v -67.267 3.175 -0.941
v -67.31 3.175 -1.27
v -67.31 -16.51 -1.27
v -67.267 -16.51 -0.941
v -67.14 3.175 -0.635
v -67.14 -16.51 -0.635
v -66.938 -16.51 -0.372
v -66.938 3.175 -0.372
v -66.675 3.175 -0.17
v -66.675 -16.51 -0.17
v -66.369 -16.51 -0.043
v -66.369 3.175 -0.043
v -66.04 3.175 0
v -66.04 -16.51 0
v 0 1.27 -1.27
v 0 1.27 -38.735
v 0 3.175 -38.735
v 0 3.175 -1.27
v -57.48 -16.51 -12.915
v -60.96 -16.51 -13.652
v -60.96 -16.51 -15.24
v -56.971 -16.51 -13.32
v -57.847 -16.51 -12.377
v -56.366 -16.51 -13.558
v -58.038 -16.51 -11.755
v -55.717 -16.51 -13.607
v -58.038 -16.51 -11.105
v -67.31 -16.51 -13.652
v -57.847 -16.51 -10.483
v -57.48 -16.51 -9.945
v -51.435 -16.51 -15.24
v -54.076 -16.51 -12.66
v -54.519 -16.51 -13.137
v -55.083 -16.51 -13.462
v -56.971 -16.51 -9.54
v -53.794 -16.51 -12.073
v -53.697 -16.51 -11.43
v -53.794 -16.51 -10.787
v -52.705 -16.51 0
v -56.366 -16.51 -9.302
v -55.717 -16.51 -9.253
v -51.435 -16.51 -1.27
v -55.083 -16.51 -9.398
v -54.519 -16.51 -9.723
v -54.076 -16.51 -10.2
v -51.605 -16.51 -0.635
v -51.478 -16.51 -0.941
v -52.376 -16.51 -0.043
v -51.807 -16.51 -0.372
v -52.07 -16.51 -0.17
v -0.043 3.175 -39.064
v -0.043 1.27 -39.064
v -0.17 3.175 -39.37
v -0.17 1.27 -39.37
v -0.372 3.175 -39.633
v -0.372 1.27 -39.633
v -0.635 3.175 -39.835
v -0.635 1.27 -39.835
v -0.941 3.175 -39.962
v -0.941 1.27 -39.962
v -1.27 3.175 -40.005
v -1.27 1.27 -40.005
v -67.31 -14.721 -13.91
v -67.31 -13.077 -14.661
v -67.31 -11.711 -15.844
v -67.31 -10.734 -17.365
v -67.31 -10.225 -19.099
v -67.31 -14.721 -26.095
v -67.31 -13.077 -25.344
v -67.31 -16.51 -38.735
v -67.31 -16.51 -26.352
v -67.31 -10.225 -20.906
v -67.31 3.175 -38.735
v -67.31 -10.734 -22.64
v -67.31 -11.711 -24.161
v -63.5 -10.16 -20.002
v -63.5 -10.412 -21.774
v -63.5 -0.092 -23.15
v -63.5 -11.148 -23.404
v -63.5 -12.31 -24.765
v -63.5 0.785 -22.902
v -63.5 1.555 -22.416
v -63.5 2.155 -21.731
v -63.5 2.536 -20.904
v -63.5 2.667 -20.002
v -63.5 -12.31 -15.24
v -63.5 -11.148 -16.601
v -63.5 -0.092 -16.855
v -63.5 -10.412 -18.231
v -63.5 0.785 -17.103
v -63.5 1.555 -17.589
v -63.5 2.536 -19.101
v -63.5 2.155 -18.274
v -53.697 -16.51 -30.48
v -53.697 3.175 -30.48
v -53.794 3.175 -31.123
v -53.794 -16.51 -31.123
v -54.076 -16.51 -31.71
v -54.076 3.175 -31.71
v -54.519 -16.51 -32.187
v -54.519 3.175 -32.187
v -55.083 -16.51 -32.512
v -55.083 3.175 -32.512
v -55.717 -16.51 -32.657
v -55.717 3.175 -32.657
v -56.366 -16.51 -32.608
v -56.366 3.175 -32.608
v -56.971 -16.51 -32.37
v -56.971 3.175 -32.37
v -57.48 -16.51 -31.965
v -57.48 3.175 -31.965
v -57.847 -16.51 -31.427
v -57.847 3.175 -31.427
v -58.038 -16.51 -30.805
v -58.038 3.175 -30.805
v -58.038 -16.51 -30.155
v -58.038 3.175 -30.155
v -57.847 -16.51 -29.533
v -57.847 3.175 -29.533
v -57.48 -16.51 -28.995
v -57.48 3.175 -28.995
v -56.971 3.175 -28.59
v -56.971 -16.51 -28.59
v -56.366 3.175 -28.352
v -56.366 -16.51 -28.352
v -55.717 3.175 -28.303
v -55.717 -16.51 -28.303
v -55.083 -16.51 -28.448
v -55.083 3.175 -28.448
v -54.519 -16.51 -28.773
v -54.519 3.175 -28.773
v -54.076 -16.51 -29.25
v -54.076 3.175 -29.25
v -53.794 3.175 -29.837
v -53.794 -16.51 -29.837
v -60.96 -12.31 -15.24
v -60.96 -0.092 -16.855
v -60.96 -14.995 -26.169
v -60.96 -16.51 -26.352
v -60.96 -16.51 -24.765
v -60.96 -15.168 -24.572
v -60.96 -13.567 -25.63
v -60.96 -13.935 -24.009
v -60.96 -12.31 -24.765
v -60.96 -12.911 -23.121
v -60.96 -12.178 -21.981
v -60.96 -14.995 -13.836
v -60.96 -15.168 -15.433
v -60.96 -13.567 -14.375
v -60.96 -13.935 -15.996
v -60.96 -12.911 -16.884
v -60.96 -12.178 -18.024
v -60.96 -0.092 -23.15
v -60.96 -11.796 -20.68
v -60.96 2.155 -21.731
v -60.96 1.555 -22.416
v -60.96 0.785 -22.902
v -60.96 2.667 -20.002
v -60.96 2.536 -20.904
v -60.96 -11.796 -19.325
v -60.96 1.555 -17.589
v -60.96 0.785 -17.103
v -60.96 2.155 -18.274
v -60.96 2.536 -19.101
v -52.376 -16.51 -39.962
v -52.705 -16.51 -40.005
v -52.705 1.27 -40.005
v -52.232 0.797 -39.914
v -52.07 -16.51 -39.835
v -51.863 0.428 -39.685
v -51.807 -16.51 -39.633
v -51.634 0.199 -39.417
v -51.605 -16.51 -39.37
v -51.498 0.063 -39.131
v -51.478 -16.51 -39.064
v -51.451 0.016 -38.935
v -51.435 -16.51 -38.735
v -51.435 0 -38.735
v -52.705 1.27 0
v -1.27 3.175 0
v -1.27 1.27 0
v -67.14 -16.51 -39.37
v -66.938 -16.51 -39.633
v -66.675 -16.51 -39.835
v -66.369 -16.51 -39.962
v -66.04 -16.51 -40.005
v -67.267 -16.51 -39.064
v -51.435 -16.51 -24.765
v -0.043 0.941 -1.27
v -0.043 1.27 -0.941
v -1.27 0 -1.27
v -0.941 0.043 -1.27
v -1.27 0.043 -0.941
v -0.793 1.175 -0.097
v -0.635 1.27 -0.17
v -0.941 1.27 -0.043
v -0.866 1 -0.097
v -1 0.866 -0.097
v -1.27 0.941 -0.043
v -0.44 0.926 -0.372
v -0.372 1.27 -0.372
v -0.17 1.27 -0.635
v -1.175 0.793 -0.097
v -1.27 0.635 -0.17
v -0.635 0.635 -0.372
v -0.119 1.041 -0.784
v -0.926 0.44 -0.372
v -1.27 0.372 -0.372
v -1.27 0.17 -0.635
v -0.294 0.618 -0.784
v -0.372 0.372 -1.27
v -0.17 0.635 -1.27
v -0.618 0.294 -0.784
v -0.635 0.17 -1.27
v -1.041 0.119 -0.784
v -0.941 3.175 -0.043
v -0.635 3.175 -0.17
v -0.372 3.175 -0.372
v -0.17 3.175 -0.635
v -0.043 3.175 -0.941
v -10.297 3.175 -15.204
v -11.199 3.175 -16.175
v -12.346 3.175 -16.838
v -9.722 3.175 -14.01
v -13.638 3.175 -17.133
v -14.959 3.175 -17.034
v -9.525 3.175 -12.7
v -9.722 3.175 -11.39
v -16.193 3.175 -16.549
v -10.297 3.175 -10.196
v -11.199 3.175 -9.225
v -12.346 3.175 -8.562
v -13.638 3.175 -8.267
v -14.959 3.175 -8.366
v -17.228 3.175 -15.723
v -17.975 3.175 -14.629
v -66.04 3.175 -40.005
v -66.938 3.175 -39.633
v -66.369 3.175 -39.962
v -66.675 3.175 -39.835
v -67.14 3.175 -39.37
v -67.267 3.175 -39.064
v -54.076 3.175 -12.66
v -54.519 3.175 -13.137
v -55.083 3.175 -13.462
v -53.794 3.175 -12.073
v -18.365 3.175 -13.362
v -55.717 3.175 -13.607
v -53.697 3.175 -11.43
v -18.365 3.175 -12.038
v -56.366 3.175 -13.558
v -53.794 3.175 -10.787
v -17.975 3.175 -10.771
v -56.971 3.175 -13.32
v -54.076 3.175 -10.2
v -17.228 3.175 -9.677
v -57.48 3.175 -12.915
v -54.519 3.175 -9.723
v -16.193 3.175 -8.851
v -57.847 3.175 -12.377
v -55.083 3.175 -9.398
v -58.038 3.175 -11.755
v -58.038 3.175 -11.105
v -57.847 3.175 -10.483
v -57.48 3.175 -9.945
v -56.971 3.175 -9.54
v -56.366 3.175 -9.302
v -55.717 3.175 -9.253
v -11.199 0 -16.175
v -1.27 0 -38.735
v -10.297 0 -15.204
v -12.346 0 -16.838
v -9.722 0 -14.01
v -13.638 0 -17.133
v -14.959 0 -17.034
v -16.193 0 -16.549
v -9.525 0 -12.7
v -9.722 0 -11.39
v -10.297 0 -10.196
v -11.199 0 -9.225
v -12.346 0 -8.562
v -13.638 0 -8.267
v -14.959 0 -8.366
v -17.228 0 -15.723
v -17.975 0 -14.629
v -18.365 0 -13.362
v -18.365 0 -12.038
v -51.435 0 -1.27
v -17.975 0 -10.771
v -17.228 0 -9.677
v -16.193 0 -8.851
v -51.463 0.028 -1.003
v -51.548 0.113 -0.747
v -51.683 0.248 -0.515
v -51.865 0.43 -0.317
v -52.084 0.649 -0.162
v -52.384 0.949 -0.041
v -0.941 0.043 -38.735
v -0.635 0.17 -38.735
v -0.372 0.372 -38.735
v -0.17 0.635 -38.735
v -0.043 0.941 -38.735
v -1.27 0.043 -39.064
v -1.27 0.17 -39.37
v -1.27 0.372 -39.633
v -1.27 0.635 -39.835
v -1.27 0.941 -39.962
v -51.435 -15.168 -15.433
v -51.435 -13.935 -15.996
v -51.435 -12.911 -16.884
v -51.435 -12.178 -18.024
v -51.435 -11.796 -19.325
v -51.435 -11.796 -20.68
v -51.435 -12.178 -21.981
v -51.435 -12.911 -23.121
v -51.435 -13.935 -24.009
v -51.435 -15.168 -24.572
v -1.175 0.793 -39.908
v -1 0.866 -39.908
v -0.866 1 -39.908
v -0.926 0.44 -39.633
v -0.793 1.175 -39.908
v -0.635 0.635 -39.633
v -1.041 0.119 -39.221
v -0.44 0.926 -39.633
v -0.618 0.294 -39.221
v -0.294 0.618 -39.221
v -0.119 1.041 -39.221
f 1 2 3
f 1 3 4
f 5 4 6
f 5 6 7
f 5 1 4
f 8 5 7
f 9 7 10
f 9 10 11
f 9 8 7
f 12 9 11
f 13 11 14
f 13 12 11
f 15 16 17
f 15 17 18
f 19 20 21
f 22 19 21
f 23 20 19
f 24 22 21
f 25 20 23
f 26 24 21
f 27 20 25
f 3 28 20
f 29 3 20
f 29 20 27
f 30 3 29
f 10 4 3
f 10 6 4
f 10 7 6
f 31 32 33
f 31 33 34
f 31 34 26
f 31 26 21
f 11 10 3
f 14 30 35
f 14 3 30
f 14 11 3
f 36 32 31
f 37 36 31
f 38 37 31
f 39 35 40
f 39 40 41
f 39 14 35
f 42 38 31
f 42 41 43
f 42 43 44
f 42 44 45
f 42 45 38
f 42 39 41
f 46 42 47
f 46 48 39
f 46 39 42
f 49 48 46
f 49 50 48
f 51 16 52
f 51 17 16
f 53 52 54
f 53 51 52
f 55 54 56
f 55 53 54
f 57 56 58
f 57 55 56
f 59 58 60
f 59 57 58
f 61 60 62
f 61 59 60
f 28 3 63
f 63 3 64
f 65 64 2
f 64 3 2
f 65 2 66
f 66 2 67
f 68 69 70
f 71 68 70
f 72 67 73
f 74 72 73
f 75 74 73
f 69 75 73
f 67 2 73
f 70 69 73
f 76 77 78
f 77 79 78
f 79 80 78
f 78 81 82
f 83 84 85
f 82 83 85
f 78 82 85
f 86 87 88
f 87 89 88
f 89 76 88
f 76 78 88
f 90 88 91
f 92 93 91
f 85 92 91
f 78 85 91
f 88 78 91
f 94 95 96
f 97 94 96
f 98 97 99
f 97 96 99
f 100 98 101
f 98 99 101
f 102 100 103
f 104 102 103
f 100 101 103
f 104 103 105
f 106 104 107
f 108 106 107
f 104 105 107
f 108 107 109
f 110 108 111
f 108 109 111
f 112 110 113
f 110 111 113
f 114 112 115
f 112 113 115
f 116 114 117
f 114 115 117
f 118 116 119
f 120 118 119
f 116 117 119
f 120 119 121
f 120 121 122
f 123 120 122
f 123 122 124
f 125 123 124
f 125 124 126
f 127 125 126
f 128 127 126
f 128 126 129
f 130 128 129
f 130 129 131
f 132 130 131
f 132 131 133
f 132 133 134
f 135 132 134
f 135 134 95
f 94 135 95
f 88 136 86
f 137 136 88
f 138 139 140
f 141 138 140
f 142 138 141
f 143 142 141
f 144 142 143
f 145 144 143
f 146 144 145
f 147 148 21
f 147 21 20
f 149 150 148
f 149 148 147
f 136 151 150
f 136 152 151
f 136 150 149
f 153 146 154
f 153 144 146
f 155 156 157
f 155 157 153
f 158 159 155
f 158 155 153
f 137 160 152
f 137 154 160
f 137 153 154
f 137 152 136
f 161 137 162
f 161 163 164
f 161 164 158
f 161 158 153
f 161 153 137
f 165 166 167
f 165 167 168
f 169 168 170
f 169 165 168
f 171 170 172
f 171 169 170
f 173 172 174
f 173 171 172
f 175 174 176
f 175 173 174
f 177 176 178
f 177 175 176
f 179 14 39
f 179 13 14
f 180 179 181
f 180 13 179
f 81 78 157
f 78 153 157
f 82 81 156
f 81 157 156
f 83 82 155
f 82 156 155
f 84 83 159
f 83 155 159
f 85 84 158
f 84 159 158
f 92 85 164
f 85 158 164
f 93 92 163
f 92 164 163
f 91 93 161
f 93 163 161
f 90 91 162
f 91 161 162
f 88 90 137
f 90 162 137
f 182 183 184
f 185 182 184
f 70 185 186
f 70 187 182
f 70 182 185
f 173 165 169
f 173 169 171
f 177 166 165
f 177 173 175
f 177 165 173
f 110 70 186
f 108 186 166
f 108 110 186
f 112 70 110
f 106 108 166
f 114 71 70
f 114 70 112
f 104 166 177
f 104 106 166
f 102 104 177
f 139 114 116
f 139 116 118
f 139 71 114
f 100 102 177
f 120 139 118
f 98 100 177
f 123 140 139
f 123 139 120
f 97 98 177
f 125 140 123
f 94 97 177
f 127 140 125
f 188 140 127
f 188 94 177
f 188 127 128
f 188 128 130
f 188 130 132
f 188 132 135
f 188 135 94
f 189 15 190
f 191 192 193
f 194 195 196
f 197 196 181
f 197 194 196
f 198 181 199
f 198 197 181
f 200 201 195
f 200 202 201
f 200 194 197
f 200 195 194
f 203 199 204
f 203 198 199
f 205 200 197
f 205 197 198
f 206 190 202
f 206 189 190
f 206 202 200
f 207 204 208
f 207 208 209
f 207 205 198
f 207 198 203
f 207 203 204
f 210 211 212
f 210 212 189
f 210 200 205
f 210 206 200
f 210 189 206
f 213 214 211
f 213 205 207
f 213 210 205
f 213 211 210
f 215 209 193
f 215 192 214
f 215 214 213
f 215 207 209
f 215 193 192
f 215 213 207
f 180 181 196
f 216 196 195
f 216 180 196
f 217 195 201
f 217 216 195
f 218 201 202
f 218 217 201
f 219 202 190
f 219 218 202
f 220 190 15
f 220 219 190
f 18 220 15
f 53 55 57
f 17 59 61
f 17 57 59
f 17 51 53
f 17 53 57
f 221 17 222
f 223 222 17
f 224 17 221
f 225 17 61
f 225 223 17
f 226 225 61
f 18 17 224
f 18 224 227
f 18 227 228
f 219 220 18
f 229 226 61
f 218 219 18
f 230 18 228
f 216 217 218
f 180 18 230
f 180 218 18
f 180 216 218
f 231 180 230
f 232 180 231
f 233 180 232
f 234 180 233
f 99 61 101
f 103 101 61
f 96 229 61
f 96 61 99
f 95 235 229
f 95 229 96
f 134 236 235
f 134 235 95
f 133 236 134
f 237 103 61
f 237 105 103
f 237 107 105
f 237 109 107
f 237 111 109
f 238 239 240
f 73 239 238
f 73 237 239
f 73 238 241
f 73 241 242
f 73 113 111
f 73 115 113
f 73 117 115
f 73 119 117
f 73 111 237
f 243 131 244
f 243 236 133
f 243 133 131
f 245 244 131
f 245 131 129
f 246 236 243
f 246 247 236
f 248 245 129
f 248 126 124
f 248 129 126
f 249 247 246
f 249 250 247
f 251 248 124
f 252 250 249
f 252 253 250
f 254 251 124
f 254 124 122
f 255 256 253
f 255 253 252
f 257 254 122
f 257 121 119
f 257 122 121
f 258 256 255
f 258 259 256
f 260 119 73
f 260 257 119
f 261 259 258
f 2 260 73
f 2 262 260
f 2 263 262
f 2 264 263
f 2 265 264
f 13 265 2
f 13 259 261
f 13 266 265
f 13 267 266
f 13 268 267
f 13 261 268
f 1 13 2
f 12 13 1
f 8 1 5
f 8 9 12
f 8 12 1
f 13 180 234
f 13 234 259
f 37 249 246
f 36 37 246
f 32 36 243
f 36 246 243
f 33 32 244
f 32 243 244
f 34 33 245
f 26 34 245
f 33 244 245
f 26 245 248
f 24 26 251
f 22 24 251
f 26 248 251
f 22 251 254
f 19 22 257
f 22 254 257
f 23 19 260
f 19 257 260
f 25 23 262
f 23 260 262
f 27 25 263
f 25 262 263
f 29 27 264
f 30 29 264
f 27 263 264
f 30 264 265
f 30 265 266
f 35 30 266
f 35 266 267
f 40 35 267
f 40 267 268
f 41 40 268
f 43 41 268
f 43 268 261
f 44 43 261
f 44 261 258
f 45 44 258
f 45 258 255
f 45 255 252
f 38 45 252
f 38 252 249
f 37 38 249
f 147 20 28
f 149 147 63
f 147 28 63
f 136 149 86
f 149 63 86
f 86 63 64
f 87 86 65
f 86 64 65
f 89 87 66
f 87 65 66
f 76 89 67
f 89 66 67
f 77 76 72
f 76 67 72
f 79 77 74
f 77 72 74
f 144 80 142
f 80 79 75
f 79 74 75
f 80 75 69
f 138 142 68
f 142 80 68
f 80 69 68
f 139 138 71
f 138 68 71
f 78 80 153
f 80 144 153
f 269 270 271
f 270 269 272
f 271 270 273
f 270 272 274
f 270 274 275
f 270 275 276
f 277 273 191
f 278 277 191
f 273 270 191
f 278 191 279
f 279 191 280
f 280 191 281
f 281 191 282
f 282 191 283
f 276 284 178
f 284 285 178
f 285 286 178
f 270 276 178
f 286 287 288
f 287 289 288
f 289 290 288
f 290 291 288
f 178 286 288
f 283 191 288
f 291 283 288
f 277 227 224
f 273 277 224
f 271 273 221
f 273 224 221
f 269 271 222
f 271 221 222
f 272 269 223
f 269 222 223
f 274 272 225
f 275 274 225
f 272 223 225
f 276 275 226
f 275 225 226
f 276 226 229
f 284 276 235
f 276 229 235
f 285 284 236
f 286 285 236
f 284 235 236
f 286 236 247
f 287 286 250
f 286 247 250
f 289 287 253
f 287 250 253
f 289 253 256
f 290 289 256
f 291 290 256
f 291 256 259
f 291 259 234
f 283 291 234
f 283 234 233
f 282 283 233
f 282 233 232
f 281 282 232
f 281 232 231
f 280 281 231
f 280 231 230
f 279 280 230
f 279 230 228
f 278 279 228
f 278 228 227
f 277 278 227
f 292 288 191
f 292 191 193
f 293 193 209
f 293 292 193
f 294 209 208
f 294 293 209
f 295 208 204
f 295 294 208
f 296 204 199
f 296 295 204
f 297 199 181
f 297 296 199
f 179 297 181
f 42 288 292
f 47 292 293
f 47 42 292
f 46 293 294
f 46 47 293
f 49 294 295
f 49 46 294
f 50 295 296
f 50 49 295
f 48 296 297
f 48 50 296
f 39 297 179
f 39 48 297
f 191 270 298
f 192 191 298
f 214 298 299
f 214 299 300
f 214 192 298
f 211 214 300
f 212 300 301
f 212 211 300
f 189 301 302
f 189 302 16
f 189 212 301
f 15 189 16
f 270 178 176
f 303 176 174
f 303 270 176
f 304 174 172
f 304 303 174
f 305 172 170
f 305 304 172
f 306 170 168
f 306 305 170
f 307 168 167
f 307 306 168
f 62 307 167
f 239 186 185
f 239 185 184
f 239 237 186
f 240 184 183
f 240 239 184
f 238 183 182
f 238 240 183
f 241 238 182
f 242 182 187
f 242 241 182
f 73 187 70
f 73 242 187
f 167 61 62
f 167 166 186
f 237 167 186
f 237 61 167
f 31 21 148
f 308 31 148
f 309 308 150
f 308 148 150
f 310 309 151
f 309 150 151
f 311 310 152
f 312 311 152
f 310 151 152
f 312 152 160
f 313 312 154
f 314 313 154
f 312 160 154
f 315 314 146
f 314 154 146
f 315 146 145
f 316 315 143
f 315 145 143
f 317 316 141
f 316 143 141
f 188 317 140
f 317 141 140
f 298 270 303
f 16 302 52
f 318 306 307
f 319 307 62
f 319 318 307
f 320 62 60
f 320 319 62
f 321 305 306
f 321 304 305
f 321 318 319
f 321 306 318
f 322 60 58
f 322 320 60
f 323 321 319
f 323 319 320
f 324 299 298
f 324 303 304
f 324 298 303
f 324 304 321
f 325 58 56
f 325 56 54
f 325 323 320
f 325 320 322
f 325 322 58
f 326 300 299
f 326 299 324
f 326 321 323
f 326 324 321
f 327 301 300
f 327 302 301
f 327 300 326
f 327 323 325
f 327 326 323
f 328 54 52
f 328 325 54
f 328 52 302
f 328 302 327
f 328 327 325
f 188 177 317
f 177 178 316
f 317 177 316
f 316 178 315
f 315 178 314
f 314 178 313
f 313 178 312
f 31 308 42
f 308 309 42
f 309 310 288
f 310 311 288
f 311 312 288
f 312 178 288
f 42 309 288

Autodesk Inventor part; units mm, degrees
ref_plane "YZ Plane" through (0, 0, 0) normal (1, 0, 0) x (0, 1, 0)
ref_plane "XZ Plane" through (0, 0, 0) normal (0, 1, 0) x (-1, 0, 0)
ref_plane "XY Plane" through (0, 0, 0) normal (0, 0, 1) x (1, 0, 0)
sketch "Sketch1" plane through (0, 0, 0) normal (0, 1, 0) x (-1, 0, 0)
  line L0 (0, 0) -> (67.31, 0)
  line L1 (67.31, 0) -> (67.31, -40.005)
  line L2 (67.31, -40.005) -> (0, -40.005)
  line L3 (0, -40.005) -> (0, 0)
  dimension "d0" = 40.005
  dimension "d1" = 67.31
extrude "Extrusion1" add sketch "Sketch1" along normal blind 3.175
sketch "Sketch2" plane through (0, 3.175, 0) normal (0, 1, 0) x (1, 0, 0)
  circle A0 centre (-13.97, 12.7) radius 4.445
  line L0 (0, 0) -> (0, 40.005) projected
  line L1 (-67.31, 0) -> (0, 0) projected
  dimension "d4" = 13.97
  dimension "d5" = 12.7
  dimension "d28" = 8.89
extrude "Extrusion2" cut sketch "Sketch2" against normal blind 6.35
sketch "Sketch3" plane through (0, 0, 0) normal (0, -1, 0) x (1, 0, 0)
  line L0 (0, -40.005) -> (-67.31, -40.005) projected
  line L1 (-67.31, 0) -> (0, 0) projected
  line L2 (-67.31, -40.005) -> (-51.435, -40.005)
  line L3 (-51.435, -40.005) -> (-51.435, 0)
  line L4 (-51.435, 0) -> (-67.31, 0)
  line L5 (-67.31, 0) -> (-67.31, -40.005)
  dimension "d8" = 15.875
extrude "Extrusion3" add sketch "Sketch3" along normal blind 16.51
sketch "Sketch4" plane through (-67.31, 3.175, -40.005) normal (-1, 0, 0) x (0, 0, 1)
  line L0 (40.005, -19.685) -> (0, -19.685) projected
  circle A0 centre (20.0025, -19.685) radius 6.35
  point P0 (40.005, -3.175)
  point P1 (13.6525, -19.685)
  point P2 (26.3525, -19.685)
  dimension "d11" = 12.7
extrude "Extrusion4" cut sketch "Sketch4" against normal blind 6.35 contours L0 A0 picked at (22.0577, -19.1784)
sketch "Sketch5" plane through (-60.96, 3.175, -40.005) normal (-1, 0, 0) x (0, 0, 1)
  line L0 (26.3525, -19.685) -> (13.6525, -19.685) projected
  line L1 (20.0025, -19.685) -> (20.0025, -3.683)
  circle A0 centre (20.0025, -3.683) radius 3.175
  arc A1 (26.3525, -19.685) -> (13.6525, -19.685) centre (20.0025, -19.685) ccw projected
  line L2 (24.765, -15.4849) -> (15.24, -15.4849)
  line L3 (24.765, -15.4849) -> (23.1501, -3.267)
  line L4 (15.24, -15.4849) -> (16.8549, -3.267)
  point P0 (40.005, -3.175)
  dimension "d14" = 16.002
  dimension "d15" = 6.35
  dimension "d16" = 9.525
extrude "Extrusion5" cut sketch "Sketch5" along normal blind 2.54 contours A1 L1 A0 L3 | A1 L4 A0 L1 | A0
sketch "Sketch6" plane through (0, 3.175, 0) normal (0, 1, 0) x (1, 0, 0)
  circle A0 centre (-55.88, 30.48) radius 2.1828
  circle A1 centre (-55.88, 11.43) radius 2.1828
  line L0 (-67.31, 40.005) -> (-67.31, 0) projected
  line L1 (-67.31, 0) -> (0, 0) projected
  line L2 (0, 40.005) -> (-67.31, 40.005) projected
  dimension "d19" = 4.3656
  dimension "d20" = 4.3656
  dimension "d21" = 11.43
  dimension "d22" = 11.43
  dimension "d23" = 19.05
  dimension "d32" = 9.525
extrude "Extrusion6" cut sketch "Sketch6" against normal blind 25.4
fillet "Fillet1" radius 1.27 9 edges at (0, 0, -20.0025) (-25.7175, 0, 0) (-25.7175, 0, -40.005) (-51.435, -8.255, 0) (0, 1.5875, 0) (0, 1.5875, -40.005) (-67.31, -6.6675, -40.005) (-51.435, -8.255, -40.005) (-67.31, -6.6675, 0)
sketch "Sketch7" plane through (-67.31, -16.51, -20.0025) normal (-1, 0, 0) x (0, 0, 1)
  arc A0 (4.7625, 4.2001) -> (-4.7625, 4.2001) centre (0, 0) ccw projected
  circle A1 centre (0, 0) radius 4.7625
  point P0 (20.0025, 16.51)
  dimension "d29" = 9.525
extrude "Extrusion7" cut sketch "Sketch7" against normal blind 25.4
properties part number "SwerveDriveBracket_A"
